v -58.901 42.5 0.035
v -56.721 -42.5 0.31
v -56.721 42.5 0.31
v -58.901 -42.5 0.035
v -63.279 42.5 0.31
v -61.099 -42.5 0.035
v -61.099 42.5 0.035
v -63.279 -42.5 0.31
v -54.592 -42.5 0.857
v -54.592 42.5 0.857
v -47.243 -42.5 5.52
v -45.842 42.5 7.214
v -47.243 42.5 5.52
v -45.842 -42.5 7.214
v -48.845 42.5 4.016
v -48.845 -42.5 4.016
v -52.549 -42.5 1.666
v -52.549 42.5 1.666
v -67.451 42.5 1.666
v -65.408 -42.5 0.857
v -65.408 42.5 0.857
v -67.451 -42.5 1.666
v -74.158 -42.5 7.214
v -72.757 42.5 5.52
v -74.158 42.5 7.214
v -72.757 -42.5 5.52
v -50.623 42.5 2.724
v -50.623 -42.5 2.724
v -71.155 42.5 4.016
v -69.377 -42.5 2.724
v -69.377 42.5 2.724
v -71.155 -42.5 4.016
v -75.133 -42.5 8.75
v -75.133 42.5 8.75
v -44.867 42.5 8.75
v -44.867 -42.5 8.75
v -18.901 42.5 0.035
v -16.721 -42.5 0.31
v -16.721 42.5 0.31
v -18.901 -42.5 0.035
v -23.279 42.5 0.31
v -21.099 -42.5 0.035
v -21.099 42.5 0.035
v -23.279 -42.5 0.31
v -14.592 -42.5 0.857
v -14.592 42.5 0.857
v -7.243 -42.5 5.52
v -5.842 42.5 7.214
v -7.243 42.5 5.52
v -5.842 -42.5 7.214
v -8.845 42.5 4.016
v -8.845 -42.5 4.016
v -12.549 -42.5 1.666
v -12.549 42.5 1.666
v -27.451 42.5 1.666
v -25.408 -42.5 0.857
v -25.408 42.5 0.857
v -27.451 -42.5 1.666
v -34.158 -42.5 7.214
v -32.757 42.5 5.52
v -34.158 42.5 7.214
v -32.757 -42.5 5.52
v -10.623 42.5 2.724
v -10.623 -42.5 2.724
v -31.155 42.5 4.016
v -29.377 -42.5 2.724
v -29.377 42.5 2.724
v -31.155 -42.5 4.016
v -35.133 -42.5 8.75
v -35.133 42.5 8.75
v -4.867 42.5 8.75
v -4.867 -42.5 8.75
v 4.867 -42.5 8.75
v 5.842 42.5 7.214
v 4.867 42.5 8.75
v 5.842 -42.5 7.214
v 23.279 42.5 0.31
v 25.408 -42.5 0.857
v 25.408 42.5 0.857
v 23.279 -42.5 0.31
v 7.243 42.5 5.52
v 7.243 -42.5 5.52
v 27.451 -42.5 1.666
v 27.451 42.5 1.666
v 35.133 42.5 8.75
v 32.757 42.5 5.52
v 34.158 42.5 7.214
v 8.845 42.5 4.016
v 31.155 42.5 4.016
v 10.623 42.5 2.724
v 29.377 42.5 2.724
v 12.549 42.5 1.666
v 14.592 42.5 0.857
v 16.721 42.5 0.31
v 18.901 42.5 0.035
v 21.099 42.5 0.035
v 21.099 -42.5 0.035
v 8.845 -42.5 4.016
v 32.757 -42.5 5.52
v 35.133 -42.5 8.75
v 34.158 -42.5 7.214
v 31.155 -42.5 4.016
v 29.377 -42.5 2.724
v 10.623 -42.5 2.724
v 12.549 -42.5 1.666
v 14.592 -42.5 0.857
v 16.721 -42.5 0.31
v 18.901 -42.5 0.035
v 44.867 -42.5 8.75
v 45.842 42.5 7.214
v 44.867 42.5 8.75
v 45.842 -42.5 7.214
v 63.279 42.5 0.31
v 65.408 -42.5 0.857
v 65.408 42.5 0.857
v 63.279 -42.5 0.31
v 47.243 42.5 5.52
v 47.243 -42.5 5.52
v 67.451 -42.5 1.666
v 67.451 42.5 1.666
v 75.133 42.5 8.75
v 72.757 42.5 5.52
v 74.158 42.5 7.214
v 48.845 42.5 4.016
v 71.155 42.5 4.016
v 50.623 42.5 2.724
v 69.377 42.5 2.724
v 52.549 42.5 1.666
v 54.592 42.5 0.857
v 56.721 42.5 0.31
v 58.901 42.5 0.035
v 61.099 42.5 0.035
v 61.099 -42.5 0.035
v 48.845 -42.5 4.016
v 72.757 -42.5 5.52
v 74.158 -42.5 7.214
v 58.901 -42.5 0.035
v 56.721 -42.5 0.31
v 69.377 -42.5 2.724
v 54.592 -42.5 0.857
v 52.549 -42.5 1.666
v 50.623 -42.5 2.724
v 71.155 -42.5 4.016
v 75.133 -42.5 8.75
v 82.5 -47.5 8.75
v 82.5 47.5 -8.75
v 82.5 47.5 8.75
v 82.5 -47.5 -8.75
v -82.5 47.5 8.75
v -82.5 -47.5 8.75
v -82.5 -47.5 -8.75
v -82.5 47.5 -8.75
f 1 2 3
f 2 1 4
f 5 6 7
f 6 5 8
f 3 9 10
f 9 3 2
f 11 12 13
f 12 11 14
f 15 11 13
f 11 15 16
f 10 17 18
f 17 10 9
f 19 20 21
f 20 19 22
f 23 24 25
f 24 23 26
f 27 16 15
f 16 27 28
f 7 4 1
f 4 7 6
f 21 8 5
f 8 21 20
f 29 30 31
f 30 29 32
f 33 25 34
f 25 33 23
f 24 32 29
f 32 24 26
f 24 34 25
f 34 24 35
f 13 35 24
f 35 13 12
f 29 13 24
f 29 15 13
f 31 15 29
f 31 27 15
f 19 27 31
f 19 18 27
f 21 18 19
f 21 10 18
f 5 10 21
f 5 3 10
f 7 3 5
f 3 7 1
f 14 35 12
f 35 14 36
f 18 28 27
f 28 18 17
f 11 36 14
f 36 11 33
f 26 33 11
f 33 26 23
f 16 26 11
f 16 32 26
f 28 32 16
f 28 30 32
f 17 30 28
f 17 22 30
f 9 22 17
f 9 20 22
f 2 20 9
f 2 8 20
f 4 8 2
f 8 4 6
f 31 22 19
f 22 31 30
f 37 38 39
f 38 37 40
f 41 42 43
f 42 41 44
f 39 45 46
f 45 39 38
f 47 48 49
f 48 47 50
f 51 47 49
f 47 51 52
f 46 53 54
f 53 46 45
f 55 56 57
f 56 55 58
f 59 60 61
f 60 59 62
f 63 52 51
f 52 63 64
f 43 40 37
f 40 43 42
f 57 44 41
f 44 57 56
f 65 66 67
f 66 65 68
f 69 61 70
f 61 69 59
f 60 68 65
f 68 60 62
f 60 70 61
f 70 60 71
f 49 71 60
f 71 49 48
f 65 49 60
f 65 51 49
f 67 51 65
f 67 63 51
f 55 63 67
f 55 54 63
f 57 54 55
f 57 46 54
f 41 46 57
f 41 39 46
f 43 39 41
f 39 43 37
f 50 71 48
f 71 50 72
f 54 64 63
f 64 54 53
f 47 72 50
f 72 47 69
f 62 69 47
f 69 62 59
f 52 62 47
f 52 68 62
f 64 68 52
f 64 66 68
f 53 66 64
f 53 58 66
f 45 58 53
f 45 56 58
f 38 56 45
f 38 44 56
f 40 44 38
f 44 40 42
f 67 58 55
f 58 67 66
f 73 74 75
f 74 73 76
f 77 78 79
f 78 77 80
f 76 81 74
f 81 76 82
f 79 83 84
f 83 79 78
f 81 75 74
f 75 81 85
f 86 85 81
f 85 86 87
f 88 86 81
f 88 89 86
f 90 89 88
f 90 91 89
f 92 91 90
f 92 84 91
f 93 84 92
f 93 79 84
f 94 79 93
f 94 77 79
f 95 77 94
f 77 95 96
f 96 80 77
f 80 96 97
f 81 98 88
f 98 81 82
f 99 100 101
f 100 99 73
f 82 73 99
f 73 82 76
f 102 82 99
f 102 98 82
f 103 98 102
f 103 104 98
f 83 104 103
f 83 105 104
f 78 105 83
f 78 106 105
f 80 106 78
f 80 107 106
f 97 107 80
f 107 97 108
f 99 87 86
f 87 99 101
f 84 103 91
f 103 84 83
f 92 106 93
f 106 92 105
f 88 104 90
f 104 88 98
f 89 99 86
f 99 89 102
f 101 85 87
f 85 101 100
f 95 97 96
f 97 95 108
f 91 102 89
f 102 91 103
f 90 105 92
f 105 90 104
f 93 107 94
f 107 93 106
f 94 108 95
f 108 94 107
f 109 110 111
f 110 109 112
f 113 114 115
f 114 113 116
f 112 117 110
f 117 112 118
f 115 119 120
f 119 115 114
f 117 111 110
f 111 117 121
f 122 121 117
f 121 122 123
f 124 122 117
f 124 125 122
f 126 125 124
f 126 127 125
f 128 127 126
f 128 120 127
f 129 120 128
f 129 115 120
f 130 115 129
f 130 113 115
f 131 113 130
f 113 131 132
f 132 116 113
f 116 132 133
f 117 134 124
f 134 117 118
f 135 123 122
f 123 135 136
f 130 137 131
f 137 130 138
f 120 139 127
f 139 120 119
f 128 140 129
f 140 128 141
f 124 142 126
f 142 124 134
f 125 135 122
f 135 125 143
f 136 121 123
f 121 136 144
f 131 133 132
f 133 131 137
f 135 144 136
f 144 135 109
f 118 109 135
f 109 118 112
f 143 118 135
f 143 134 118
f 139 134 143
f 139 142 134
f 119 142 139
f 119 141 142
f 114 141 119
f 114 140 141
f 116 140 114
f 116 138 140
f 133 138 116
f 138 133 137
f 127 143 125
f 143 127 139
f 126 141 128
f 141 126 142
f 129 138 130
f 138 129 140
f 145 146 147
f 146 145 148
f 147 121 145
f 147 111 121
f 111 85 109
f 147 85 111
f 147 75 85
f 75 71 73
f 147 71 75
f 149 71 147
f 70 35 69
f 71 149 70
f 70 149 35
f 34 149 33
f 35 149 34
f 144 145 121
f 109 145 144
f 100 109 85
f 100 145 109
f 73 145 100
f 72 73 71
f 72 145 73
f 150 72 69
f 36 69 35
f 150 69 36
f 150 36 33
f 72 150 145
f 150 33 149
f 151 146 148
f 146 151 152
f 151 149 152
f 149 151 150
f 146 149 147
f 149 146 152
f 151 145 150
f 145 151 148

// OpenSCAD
/***********************************************************************
Name ......... : bottleStand.scad
Description....: Customizable Small Bottle Stand
Author ....... : Garrett Melenka
Version ...... : V1.0 2016/12/31
Licence ...... : GPL
***********************************************************************/

//measured bottle diameter + a small clearance
bottleDiameter = 35.0;
//measured bottle height + a small clearance
bottleHeight = 85.0;

//number of bottles
numBottles = 4;

//Spacing around edges
edge = 10;
//Spacing Between Bottles
bottleSpace = 5;


module bottleStand()
{
    
    L = (bottleDiameter + bottleSpace)*numBottles + edge*0.5;
    
    difference(){
    cube([L, bottleHeight+edge, bottleDiameter*0.5], center = true);
    
    
    for(i=[0:1:numBottles-1]){
    
        
     x = -L*0.5 + (bottleDiameter*0.5+edge*0.5) + (bottleDiameter+bottleSpace)*i;
     //x=-L*0.5 + bottleDiameter-edge*0.5;   
        
    translate([x,0,bottleDiameter*0.5]){
    
    rotate([90,0,0]){
    cylinder(r=bottleDiameter*0.5, h=bottleHeight, center = true, $fn=50);
    }
    }
    }
    }
    
}






bottleStand();
